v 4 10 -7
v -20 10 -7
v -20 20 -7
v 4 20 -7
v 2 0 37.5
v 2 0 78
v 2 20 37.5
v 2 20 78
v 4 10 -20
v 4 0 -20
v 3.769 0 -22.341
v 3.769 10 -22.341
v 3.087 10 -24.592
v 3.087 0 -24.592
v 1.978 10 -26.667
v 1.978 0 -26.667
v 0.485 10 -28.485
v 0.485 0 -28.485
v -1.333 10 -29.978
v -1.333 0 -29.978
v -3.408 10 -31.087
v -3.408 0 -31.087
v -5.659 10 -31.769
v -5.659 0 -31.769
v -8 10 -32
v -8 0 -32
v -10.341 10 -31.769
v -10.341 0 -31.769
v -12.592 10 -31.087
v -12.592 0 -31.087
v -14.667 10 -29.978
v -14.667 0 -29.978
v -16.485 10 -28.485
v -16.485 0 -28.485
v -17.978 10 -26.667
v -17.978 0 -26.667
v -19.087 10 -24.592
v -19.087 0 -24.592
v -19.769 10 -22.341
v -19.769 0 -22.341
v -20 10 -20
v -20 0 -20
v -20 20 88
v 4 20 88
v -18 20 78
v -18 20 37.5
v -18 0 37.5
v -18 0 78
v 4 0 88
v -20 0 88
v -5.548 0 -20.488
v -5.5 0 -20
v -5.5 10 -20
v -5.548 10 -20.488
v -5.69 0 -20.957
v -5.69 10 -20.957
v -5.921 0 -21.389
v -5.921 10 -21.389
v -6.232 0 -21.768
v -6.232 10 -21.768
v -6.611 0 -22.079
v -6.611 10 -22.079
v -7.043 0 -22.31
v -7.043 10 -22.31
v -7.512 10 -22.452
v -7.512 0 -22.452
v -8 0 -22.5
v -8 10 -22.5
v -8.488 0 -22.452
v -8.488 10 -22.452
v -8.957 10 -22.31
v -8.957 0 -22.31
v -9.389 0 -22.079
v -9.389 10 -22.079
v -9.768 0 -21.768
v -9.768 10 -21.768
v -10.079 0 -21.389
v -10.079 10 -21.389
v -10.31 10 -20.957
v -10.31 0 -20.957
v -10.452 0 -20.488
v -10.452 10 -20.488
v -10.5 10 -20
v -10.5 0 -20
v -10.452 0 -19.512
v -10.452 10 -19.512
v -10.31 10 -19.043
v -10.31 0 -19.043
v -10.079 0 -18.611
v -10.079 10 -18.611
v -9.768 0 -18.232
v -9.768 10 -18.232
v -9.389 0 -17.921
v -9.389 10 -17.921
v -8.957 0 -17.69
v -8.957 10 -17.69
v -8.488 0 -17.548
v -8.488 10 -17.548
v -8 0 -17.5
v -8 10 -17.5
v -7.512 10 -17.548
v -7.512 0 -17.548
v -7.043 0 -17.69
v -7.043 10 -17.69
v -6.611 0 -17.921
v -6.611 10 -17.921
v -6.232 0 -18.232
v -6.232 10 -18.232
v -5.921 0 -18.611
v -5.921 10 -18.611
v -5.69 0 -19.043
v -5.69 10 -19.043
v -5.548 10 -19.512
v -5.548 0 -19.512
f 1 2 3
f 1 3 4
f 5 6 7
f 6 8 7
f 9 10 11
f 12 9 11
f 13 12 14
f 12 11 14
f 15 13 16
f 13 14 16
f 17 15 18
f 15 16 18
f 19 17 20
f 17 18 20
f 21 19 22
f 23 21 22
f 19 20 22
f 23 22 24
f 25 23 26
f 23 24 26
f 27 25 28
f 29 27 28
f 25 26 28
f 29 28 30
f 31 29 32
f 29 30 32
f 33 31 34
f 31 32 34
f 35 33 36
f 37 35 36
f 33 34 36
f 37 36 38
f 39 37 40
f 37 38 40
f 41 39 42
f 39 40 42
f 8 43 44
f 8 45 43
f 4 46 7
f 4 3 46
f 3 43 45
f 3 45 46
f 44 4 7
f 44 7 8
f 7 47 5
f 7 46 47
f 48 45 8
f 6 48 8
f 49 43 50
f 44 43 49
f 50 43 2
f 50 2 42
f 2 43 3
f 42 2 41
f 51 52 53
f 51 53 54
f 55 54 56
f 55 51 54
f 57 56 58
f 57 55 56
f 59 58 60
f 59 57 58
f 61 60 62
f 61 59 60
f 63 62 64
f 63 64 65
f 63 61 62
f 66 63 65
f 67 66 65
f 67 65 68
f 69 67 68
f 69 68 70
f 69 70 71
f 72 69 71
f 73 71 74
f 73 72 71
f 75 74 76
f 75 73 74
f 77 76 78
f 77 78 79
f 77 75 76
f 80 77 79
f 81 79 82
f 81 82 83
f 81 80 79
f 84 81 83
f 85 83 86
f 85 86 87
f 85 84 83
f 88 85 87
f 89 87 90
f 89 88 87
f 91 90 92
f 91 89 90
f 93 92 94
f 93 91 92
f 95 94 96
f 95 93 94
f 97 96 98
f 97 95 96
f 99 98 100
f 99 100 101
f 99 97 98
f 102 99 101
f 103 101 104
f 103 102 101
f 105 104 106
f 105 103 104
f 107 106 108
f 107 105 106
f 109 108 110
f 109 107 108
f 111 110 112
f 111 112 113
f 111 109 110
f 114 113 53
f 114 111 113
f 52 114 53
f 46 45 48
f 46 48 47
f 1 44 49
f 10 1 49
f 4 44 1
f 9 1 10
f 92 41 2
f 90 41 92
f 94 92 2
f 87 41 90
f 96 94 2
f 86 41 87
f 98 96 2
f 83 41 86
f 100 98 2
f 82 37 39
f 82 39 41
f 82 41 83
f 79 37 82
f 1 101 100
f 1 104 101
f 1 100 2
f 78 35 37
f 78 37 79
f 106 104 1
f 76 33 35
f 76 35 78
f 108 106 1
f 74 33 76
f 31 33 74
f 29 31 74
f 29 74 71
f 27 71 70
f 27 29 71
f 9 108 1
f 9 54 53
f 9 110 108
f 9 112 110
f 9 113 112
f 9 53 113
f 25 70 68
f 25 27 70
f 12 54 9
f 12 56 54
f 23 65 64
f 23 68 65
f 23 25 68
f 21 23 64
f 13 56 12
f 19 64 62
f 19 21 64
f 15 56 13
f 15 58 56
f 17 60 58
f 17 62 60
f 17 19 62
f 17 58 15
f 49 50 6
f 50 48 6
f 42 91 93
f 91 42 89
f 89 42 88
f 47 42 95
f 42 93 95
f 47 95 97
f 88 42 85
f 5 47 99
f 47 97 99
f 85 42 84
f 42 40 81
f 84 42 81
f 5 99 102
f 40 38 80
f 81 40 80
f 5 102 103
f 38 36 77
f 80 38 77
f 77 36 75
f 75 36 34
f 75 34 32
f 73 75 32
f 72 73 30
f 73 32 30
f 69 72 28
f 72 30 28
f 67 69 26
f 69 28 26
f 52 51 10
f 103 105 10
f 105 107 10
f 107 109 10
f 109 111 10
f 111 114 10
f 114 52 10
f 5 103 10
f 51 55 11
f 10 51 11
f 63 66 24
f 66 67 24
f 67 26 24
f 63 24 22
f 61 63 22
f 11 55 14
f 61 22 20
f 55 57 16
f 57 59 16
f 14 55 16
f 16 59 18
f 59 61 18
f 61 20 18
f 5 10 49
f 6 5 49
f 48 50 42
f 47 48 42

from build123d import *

# Parameters (mm, degrees)
SKETCH3_R                = 2.5
BOSS_EXTRUDE2_DEPTH      = 10
BOSS_EXTRUDE3_DEPTH      = 10
BOSS_EXTRUDE3_DEPTH_BACK = 10
SKETCH4_W                = 24
SKETCH4_H                = 95
SKETCH4_W_2              = 20
SKETCH4_H_2              = 40.5


with BuildPart() as part:
    # Sketch3 → Boss-Extrude2 (new body)
    with BuildSketch(Plane(origin=(0, 0, 0), x_dir=(1, 0, 0), z_dir=(0, 1, 0))):
        with BuildLine():
            ThreePointArc((4, 20), (-8, 32), (-20, 20))
            Line((-20, 20), (-20, 7))
            Line((-20, 7), (4, 7))
            Line((4, 7), (4, 20))
        make_face()
        with Locations((-8, 20)):
            Circle(SKETCH3_R, mode=Mode.SUBTRACT)
    extrude(amount=BOSS_EXTRUDE2_DEPTH)

    # Sketch4 → Boss-Extrude3 (add, two sides: drawn at the far end of the back side and taken through both)
    with BuildSketch(Plane(origin=(0, 10, 0), x_dir=(1, 0, 0), z_dir=(0, 1, 0)).offset(-BOSS_EXTRUDE3_DEPTH_BACK)):
        with Locations((-8, -40.5)):
            Rectangle(SKETCH4_W, SKETCH4_H)
        with Locations((-8, -57.75)):
            Rectangle(SKETCH4_W_2, SKETCH4_H_2, mode=Mode.SUBTRACT)
    extrude(amount=BOSS_EXTRUDE3_DEPTH + BOSS_EXTRUDE3_DEPTH_BACK)


solid = part.part
